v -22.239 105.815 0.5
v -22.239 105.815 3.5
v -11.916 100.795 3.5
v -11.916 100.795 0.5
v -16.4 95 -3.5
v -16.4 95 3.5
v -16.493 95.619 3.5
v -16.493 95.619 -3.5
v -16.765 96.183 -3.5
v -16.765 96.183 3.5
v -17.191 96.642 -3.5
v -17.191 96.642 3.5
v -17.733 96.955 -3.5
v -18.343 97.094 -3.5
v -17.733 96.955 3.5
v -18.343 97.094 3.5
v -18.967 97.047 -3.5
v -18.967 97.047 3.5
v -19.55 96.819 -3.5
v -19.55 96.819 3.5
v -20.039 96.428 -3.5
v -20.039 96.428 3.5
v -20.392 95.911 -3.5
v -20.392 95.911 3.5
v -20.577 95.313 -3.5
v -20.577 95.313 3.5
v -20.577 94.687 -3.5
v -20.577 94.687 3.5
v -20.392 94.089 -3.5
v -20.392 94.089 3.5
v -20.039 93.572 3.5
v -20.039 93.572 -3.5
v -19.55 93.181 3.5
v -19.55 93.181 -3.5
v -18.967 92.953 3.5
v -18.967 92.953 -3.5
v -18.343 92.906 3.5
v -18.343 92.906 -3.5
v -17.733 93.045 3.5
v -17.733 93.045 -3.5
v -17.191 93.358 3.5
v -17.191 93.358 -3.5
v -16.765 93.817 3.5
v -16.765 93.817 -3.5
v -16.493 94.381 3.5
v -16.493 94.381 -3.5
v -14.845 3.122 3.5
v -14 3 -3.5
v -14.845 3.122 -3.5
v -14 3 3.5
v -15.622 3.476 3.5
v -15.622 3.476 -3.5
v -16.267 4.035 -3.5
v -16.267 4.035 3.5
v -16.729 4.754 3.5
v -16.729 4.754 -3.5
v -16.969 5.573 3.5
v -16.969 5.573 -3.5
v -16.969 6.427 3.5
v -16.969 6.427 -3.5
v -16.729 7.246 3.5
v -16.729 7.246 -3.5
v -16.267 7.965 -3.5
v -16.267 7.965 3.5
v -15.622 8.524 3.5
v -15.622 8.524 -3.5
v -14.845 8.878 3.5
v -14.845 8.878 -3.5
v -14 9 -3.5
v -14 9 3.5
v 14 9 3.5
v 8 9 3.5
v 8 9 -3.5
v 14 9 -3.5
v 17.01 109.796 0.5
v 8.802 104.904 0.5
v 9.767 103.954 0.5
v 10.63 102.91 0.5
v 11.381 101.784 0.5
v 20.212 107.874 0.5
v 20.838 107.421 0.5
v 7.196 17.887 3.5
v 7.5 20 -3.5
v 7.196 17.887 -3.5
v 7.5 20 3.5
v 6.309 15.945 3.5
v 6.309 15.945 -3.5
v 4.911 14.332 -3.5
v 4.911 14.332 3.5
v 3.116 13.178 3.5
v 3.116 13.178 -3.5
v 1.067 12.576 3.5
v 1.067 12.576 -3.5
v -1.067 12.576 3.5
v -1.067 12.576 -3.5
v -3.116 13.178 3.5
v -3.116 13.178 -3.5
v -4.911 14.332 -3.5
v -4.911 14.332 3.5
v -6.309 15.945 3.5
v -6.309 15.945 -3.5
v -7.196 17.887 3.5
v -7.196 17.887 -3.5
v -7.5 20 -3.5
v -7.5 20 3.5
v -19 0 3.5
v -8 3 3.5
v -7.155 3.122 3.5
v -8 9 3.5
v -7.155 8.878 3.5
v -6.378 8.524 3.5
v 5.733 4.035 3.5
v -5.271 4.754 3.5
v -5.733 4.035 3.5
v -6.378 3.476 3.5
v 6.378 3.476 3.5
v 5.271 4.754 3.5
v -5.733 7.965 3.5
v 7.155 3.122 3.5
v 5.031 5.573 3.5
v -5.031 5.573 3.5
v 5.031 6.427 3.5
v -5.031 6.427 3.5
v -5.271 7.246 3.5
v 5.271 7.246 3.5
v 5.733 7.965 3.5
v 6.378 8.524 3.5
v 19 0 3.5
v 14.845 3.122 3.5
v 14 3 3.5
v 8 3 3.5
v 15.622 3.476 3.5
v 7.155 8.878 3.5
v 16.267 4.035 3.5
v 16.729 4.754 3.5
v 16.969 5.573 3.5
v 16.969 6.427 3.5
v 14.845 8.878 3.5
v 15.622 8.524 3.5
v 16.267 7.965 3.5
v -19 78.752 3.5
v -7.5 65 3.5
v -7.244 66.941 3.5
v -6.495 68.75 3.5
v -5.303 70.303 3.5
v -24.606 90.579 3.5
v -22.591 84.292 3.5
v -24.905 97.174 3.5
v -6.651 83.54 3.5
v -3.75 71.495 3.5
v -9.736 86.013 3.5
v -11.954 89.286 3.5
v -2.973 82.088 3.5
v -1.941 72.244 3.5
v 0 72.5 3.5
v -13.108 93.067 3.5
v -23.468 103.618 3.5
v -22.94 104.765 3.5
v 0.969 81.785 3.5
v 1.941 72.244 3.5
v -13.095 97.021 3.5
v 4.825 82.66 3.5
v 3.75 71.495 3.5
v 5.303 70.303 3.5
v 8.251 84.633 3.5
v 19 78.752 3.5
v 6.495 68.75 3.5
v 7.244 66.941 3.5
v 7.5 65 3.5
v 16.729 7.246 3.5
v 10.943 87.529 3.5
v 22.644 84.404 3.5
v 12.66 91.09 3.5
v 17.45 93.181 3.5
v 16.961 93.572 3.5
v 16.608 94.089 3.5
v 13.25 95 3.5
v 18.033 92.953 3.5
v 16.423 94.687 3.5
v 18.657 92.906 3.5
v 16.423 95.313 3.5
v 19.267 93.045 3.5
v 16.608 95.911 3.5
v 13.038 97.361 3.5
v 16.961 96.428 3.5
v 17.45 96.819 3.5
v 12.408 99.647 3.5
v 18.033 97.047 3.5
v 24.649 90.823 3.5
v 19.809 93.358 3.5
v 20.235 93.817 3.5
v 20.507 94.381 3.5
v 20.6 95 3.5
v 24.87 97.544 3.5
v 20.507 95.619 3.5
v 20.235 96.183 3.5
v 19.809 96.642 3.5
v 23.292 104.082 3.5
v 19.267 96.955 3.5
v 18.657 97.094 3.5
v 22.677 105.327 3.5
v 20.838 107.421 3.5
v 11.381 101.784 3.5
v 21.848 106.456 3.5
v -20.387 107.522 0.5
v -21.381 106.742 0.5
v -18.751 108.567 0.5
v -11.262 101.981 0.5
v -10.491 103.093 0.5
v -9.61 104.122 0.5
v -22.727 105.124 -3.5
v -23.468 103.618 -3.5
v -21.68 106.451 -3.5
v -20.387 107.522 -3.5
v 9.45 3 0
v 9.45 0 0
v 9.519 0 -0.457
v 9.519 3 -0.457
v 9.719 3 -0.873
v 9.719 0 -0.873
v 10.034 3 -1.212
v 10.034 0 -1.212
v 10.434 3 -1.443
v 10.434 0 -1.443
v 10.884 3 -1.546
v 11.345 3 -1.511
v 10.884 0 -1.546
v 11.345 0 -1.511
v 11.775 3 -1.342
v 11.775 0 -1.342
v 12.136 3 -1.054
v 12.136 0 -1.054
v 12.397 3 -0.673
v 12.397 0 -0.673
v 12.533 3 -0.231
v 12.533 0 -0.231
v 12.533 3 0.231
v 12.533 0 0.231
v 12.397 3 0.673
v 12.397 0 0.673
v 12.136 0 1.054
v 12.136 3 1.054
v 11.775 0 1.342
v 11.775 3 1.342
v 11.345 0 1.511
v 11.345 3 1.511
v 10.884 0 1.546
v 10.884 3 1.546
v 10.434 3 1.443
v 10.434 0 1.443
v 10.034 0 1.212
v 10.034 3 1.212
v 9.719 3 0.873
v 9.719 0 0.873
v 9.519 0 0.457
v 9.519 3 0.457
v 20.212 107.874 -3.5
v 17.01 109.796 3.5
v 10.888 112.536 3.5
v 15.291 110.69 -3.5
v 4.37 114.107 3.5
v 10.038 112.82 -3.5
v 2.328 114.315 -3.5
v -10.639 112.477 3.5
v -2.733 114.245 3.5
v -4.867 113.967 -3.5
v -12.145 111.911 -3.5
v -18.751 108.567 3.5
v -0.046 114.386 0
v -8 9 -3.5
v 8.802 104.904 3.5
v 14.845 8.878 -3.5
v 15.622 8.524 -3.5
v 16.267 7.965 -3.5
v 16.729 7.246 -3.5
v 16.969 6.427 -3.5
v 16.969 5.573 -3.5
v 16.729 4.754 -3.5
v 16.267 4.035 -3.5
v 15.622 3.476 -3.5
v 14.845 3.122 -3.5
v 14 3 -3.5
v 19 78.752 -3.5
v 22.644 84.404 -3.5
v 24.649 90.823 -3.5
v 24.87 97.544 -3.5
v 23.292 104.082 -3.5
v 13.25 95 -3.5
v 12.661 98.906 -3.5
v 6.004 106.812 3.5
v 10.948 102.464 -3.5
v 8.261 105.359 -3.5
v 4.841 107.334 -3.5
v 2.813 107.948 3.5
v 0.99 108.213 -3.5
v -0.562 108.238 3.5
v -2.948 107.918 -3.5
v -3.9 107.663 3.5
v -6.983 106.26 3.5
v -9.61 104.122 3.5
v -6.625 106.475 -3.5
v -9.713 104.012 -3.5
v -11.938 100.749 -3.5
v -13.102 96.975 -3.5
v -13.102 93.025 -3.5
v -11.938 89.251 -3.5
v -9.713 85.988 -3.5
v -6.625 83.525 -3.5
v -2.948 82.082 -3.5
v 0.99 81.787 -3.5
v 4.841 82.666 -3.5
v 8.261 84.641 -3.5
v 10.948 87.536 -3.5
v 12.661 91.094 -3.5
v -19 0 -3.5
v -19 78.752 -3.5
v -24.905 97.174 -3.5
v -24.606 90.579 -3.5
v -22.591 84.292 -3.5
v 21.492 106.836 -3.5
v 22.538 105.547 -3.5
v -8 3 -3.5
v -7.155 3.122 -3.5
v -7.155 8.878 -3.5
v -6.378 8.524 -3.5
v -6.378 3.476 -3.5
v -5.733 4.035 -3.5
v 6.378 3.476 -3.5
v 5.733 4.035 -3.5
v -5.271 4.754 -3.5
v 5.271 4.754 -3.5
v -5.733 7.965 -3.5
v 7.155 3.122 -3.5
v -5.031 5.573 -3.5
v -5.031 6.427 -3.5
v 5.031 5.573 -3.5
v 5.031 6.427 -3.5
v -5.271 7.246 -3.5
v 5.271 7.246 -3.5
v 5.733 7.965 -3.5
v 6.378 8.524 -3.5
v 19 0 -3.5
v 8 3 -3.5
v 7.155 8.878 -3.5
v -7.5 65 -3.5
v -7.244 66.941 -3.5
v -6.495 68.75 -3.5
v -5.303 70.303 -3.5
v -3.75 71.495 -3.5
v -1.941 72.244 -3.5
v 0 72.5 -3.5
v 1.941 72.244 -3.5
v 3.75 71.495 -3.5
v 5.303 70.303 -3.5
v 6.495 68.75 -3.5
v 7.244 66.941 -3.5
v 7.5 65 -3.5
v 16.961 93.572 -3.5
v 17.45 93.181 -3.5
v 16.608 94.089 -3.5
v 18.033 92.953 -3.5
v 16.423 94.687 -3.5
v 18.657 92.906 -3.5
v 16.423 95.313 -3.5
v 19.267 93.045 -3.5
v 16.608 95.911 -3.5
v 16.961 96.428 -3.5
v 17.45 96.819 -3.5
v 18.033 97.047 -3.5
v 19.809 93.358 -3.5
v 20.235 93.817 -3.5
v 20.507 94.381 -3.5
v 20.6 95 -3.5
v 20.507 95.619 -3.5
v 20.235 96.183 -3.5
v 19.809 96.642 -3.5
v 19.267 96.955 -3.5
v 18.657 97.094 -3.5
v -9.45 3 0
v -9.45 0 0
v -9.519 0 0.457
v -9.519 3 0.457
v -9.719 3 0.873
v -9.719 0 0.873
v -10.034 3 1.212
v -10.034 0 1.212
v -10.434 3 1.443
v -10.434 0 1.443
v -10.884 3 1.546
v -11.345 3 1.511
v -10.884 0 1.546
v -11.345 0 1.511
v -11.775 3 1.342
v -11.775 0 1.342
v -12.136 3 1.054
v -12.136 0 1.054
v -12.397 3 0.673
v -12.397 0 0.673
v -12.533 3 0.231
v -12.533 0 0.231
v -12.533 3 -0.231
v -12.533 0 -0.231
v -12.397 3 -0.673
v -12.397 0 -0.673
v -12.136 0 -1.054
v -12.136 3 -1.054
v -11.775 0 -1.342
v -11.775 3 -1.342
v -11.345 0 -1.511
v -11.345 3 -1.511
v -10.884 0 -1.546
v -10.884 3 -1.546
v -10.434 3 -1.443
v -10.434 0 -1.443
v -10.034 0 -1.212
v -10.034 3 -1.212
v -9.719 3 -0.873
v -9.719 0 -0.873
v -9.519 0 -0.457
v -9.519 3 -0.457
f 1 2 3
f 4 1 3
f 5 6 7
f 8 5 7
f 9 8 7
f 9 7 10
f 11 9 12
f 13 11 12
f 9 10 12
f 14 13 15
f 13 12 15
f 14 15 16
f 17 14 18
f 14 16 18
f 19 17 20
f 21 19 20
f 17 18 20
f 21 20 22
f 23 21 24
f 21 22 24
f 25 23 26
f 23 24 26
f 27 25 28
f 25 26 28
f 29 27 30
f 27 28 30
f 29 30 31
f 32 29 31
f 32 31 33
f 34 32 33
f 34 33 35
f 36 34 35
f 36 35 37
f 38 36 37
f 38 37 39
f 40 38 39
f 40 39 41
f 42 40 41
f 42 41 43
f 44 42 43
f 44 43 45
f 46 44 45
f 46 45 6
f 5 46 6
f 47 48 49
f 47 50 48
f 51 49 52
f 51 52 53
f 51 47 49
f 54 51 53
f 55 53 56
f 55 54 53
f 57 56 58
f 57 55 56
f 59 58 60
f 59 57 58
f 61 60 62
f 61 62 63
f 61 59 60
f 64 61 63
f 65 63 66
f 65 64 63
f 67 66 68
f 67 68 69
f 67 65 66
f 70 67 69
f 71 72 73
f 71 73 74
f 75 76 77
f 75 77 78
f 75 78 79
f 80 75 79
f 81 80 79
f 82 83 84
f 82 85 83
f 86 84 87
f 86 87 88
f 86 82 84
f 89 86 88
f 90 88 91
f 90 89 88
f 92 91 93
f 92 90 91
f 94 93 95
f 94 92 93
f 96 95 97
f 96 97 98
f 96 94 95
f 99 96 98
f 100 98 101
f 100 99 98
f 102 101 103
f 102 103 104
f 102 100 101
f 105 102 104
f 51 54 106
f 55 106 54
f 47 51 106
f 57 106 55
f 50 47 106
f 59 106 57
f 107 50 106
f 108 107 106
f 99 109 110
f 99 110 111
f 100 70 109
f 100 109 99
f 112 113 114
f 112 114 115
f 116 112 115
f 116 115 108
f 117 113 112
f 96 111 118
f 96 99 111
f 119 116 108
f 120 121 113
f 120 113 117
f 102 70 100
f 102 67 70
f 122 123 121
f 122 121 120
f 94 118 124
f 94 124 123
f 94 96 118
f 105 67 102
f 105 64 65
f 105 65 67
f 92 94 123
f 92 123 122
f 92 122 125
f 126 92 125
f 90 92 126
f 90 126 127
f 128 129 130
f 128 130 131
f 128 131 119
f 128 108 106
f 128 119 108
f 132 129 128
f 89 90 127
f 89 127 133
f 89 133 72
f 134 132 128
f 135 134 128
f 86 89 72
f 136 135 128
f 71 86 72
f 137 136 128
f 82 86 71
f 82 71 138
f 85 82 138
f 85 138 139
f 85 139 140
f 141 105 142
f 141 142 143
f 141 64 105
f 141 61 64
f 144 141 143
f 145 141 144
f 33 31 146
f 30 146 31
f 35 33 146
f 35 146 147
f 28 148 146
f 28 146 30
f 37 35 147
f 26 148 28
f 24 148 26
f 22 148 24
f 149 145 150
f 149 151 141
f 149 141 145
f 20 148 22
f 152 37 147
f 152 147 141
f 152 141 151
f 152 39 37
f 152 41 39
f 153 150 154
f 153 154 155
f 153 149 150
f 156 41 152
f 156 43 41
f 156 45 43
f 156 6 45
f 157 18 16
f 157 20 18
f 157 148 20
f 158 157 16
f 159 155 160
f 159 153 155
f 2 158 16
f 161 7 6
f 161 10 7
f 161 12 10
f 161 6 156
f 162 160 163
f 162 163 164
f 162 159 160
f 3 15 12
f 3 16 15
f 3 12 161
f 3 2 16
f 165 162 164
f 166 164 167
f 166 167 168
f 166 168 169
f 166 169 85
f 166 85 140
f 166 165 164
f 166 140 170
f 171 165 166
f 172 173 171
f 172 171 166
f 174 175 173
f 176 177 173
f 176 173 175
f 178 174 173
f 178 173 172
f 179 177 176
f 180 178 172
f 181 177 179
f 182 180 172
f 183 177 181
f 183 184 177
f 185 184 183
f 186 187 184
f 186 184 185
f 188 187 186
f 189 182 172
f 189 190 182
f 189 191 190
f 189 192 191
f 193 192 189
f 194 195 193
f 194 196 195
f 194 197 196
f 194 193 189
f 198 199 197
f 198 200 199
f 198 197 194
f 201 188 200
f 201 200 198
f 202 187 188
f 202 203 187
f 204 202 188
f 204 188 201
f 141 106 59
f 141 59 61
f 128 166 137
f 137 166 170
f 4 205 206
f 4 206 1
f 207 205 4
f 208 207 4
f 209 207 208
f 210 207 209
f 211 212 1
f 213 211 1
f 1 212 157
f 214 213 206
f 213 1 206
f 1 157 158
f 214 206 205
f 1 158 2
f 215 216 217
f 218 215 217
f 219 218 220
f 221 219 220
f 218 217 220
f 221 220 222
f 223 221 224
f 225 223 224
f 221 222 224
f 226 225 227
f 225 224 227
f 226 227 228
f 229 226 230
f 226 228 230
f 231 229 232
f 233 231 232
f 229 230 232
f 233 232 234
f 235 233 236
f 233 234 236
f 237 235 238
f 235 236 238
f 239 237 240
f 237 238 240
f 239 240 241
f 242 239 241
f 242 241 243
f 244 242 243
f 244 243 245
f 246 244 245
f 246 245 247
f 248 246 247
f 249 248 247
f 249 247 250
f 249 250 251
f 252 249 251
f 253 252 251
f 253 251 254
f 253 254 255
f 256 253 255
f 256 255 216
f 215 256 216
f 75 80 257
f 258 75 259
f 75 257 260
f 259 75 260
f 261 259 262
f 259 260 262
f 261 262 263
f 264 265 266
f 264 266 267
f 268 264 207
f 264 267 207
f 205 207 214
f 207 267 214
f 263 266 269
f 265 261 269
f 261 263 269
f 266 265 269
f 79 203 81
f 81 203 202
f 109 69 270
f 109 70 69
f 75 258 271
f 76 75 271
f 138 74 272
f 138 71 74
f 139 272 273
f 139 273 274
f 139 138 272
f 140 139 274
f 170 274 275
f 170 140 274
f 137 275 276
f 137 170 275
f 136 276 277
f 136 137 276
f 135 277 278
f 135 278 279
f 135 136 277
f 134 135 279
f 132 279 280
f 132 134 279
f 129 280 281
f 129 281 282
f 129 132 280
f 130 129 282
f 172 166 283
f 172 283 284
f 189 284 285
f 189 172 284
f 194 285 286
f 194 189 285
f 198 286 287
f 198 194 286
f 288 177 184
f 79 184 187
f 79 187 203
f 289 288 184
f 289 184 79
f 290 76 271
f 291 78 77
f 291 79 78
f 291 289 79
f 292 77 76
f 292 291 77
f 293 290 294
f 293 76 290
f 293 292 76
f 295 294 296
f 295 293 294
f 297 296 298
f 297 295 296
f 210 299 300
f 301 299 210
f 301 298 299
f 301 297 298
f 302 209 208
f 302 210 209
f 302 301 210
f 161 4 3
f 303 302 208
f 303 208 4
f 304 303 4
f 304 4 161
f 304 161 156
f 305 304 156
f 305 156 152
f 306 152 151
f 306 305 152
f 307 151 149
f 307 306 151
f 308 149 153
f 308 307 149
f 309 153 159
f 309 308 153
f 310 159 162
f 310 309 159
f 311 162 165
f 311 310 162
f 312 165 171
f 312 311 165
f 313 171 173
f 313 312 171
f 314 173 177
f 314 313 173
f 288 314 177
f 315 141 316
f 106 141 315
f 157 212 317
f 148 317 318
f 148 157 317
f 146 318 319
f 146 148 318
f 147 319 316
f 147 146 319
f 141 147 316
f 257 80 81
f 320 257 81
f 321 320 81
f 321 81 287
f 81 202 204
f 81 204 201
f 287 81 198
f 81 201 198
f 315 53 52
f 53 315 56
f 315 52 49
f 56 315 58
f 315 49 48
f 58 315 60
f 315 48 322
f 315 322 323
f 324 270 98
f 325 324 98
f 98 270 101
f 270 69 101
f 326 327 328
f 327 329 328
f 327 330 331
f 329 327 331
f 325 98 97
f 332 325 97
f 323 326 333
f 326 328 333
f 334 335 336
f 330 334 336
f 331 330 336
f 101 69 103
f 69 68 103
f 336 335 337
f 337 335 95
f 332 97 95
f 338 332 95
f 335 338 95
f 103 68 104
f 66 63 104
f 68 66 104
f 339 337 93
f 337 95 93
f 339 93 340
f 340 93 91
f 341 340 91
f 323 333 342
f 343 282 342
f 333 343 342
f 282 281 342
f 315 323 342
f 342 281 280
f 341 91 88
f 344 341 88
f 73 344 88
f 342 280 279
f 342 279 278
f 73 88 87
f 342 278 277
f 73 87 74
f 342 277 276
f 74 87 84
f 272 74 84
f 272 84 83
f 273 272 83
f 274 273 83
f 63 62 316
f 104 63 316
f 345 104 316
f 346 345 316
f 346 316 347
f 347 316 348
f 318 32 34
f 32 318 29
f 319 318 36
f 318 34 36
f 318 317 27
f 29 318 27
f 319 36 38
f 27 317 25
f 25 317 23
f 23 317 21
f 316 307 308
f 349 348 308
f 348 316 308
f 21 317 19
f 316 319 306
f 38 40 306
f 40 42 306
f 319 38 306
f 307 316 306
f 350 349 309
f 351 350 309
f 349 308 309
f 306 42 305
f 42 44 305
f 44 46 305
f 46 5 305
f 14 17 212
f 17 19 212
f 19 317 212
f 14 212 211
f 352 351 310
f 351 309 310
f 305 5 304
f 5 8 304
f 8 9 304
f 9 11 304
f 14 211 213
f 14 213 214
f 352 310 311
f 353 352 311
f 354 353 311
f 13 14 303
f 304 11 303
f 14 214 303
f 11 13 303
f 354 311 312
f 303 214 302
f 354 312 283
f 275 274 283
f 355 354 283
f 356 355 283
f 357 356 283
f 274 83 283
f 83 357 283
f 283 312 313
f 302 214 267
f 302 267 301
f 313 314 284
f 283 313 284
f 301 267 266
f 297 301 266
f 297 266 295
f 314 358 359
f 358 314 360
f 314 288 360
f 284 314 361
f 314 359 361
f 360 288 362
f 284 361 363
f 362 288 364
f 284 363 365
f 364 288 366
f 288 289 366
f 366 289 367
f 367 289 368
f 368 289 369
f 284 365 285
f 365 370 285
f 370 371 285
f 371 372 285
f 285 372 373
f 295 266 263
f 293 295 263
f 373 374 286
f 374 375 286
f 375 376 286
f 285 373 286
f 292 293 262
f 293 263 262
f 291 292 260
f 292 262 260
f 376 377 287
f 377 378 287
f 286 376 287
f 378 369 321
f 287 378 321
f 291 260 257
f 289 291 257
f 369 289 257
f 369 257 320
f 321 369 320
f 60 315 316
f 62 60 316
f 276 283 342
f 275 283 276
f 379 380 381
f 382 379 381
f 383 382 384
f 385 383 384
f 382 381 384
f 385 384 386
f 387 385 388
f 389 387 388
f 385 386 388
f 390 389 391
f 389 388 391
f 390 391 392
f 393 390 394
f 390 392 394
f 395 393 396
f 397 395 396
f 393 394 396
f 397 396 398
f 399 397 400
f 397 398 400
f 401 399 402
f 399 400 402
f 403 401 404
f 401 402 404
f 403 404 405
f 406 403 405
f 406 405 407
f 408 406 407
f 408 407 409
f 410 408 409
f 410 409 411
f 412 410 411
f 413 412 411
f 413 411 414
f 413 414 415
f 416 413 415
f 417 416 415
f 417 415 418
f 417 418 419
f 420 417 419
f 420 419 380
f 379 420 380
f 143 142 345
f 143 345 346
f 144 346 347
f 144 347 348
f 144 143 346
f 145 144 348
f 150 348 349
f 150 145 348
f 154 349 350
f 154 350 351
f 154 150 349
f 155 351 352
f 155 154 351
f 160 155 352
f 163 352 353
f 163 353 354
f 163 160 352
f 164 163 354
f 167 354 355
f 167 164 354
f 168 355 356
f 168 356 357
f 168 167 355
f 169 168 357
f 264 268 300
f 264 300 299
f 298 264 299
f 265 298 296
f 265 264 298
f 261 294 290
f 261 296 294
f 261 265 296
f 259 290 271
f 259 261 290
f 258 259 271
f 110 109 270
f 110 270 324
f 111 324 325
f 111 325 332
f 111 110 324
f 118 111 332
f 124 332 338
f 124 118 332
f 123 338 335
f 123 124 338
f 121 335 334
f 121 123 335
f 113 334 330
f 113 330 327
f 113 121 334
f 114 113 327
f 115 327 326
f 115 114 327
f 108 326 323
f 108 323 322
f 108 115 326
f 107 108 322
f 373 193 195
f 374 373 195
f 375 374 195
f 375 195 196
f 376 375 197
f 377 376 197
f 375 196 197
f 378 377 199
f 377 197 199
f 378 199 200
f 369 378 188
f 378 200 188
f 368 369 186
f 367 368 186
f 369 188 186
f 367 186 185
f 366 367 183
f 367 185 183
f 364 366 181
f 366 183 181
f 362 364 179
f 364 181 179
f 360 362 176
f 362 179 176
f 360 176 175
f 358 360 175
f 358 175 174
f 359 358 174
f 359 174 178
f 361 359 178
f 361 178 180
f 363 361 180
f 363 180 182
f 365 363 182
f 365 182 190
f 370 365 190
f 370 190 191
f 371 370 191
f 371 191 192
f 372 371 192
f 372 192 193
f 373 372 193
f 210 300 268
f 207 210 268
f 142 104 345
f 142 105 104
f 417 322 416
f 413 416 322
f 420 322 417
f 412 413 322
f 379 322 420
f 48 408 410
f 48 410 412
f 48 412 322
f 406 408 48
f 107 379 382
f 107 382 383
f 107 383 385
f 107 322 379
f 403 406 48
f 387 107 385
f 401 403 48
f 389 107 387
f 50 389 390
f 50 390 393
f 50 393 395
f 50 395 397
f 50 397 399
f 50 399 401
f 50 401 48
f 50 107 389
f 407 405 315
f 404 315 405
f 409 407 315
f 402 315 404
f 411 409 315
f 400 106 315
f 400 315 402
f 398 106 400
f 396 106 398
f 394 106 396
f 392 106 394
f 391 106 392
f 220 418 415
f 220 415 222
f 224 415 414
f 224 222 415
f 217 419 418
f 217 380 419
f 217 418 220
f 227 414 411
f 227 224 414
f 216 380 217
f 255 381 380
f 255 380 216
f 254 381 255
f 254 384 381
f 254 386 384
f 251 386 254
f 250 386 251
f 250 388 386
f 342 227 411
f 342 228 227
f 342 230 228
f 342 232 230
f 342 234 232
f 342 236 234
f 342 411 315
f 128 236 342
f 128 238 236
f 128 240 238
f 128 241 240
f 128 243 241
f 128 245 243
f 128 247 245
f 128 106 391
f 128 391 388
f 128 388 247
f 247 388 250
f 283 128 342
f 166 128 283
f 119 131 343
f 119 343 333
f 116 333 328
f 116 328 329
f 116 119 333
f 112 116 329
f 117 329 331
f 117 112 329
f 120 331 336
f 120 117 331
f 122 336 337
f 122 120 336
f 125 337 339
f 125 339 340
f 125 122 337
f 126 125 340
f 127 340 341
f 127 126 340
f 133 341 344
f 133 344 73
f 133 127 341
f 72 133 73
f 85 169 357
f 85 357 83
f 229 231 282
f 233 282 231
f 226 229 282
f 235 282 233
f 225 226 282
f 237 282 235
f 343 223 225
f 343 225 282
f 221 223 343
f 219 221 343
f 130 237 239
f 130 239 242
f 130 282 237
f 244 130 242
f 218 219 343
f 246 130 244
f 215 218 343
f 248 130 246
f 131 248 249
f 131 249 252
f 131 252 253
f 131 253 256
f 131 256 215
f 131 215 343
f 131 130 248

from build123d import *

# Parameters (mm, degrees)
SKETCH_1_R          = 13.25
EXTRUDE_1_DEPTH     = 3.5
SKETCH4_R           = 1.55
CUT_EXTRUDE5_DEPTH  = 5
SKETCH_2_R          = 2.1
CUT_EXTRUDE_1_DEPTH = 10
CUT_EXTRUDE_2_DEPTH = 171.144056611
FILLET_1_R          = 8
CUT_EXTRUDE_3_DEPTH = 3


with BuildPart() as part:
    # 草图1 → 凸台-拉伸1 (new, symmetric)
    with BuildSketch(Plane.XY):
        with BuildLine():
            Line((-19, 0), (19, 0))
            Line((19, 0), (19, 78.751923191))
            ThreePointArc((19, 78.751923191), (0, 120), (-19, 78.751923191))
            Line((-19, 78.751923191), (-19, 0))
        make_face()
        with BuildLine():
            ThreePointArc((-8, 9), (-5, 6), (-8, 3))
            Line((-8, 3), (-14, 3))
            ThreePointArc((-14, 3), (-17, 6), (-14, 9))
            Line((-14, 9), (-8, 9))
        make_face(mode=Mode.SUBTRACT)
        with BuildLine():
            ThreePointArc((8, 3), (5, 6), (8, 9))
            Line((8, 9), (14, 9))
            ThreePointArc((14, 9), (17, 6), (14, 3))
            Line((14, 3), (8, 3))
        make_face(mode=Mode.SUBTRACT)
        with BuildLine():
            ThreePointArc((-7.5, 65), (-5.303300859, 70.303300859), (0, 72.5))
            ThreePointArc((0, 72.5), (5.303300859, 70.303300859), (7.5, 65))
            Line((7.5, 65), (7.5, 20))
            ThreePointArc((7.5, 20), (0, 12.5), (-7.5, 20))
            Line((-7.5, 20), (-7.5, 65))
        make_face(mode=Mode.SUBTRACT)
        with Locations((0, 95)):
            Circle(SKETCH_1_R, mode=Mode.SUBTRACT)
    extrude(amount=EXTRUDE_1_DEPTH, both=True)

    # Sketch4 → Cut-Extrude5 (cut)
    with BuildSketch(Plane(origin=(0, 0, 0), x_dir=(-1, 0, 0), z_dir=(0, -1, 0))):
        with Locations(Location((11, 0, 0), (0, 0, 180))):
            Circle(SKETCH4_R)
        with Locations((-11, 0)):
            Circle(SKETCH4_R)
    extrude(amount=-CUT_EXTRUDE5_DEPTH, mode=Mode.SUBTRACT)

    # 草图2 → 切除-拉伸1 (cut)
    with BuildSketch(Plane.XY.offset(3.5)):
        with Locations((-18.5, 95)):
            Circle(SKETCH_2_R)
        with Locations((18.5, 95)):
            Circle(SKETCH_2_R)
    extrude(amount=-CUT_EXTRUDE_1_DEPTH, mode=Mode.SUBTRACT)

    # 草图4 → 切除-拉伸2 (cut, through all)
    with BuildSketch(Plane(origin=(0, 0, -114.5), x_dir=(-1, 0, 0), z_dir=(0, 0, -1))):
        with BuildLine():
            ThreePointArc((22.386292421, 106.128967232), (0.219572962, 119.999035736), (-22.187356595, 106.520469059))
            add(Edge.make_bspline(
                [(-22.187356595, 106.520469059), (0, 122.446847778), (22.386292421, 106.128967232)],
                knots=[0, 0, 0, 1, 1, 1], degree=2))
        make_face()
    extrude(amount=-CUT_EXTRUDE_2_DEPTH, mode=Mode.SUBTRACT)

    # 圆角1
    fillet_1_edges = [part.edges().sort_by_distance(p)[0] for p in [
        (-22.386292421, 106.128967232, 0),
        (22.187356595, 106.520469059, 0),
    ]]
    fillet(fillet_1_edges, radius=FILLET_1_R)

    # 草图5 → 切除-拉伸3 (cut)
    with BuildSketch(Plane.XY.offset(3.5)):
        Polygon((-22.238605802, 105.815360884), (0, 95), (-0.192853393, 99.54174681), (-22.228779927, 110.258538141), align=None)
        Polygon((-0.192853393, 99.54174681), (0, 95), (21.241716437, 107.661638988), (20.855269273, 112.087989547), align=None)
    extrude(amount=-CUT_EXTRUDE_3_DEPTH, mode=Mode.SUBTRACT)


solid = part.part
